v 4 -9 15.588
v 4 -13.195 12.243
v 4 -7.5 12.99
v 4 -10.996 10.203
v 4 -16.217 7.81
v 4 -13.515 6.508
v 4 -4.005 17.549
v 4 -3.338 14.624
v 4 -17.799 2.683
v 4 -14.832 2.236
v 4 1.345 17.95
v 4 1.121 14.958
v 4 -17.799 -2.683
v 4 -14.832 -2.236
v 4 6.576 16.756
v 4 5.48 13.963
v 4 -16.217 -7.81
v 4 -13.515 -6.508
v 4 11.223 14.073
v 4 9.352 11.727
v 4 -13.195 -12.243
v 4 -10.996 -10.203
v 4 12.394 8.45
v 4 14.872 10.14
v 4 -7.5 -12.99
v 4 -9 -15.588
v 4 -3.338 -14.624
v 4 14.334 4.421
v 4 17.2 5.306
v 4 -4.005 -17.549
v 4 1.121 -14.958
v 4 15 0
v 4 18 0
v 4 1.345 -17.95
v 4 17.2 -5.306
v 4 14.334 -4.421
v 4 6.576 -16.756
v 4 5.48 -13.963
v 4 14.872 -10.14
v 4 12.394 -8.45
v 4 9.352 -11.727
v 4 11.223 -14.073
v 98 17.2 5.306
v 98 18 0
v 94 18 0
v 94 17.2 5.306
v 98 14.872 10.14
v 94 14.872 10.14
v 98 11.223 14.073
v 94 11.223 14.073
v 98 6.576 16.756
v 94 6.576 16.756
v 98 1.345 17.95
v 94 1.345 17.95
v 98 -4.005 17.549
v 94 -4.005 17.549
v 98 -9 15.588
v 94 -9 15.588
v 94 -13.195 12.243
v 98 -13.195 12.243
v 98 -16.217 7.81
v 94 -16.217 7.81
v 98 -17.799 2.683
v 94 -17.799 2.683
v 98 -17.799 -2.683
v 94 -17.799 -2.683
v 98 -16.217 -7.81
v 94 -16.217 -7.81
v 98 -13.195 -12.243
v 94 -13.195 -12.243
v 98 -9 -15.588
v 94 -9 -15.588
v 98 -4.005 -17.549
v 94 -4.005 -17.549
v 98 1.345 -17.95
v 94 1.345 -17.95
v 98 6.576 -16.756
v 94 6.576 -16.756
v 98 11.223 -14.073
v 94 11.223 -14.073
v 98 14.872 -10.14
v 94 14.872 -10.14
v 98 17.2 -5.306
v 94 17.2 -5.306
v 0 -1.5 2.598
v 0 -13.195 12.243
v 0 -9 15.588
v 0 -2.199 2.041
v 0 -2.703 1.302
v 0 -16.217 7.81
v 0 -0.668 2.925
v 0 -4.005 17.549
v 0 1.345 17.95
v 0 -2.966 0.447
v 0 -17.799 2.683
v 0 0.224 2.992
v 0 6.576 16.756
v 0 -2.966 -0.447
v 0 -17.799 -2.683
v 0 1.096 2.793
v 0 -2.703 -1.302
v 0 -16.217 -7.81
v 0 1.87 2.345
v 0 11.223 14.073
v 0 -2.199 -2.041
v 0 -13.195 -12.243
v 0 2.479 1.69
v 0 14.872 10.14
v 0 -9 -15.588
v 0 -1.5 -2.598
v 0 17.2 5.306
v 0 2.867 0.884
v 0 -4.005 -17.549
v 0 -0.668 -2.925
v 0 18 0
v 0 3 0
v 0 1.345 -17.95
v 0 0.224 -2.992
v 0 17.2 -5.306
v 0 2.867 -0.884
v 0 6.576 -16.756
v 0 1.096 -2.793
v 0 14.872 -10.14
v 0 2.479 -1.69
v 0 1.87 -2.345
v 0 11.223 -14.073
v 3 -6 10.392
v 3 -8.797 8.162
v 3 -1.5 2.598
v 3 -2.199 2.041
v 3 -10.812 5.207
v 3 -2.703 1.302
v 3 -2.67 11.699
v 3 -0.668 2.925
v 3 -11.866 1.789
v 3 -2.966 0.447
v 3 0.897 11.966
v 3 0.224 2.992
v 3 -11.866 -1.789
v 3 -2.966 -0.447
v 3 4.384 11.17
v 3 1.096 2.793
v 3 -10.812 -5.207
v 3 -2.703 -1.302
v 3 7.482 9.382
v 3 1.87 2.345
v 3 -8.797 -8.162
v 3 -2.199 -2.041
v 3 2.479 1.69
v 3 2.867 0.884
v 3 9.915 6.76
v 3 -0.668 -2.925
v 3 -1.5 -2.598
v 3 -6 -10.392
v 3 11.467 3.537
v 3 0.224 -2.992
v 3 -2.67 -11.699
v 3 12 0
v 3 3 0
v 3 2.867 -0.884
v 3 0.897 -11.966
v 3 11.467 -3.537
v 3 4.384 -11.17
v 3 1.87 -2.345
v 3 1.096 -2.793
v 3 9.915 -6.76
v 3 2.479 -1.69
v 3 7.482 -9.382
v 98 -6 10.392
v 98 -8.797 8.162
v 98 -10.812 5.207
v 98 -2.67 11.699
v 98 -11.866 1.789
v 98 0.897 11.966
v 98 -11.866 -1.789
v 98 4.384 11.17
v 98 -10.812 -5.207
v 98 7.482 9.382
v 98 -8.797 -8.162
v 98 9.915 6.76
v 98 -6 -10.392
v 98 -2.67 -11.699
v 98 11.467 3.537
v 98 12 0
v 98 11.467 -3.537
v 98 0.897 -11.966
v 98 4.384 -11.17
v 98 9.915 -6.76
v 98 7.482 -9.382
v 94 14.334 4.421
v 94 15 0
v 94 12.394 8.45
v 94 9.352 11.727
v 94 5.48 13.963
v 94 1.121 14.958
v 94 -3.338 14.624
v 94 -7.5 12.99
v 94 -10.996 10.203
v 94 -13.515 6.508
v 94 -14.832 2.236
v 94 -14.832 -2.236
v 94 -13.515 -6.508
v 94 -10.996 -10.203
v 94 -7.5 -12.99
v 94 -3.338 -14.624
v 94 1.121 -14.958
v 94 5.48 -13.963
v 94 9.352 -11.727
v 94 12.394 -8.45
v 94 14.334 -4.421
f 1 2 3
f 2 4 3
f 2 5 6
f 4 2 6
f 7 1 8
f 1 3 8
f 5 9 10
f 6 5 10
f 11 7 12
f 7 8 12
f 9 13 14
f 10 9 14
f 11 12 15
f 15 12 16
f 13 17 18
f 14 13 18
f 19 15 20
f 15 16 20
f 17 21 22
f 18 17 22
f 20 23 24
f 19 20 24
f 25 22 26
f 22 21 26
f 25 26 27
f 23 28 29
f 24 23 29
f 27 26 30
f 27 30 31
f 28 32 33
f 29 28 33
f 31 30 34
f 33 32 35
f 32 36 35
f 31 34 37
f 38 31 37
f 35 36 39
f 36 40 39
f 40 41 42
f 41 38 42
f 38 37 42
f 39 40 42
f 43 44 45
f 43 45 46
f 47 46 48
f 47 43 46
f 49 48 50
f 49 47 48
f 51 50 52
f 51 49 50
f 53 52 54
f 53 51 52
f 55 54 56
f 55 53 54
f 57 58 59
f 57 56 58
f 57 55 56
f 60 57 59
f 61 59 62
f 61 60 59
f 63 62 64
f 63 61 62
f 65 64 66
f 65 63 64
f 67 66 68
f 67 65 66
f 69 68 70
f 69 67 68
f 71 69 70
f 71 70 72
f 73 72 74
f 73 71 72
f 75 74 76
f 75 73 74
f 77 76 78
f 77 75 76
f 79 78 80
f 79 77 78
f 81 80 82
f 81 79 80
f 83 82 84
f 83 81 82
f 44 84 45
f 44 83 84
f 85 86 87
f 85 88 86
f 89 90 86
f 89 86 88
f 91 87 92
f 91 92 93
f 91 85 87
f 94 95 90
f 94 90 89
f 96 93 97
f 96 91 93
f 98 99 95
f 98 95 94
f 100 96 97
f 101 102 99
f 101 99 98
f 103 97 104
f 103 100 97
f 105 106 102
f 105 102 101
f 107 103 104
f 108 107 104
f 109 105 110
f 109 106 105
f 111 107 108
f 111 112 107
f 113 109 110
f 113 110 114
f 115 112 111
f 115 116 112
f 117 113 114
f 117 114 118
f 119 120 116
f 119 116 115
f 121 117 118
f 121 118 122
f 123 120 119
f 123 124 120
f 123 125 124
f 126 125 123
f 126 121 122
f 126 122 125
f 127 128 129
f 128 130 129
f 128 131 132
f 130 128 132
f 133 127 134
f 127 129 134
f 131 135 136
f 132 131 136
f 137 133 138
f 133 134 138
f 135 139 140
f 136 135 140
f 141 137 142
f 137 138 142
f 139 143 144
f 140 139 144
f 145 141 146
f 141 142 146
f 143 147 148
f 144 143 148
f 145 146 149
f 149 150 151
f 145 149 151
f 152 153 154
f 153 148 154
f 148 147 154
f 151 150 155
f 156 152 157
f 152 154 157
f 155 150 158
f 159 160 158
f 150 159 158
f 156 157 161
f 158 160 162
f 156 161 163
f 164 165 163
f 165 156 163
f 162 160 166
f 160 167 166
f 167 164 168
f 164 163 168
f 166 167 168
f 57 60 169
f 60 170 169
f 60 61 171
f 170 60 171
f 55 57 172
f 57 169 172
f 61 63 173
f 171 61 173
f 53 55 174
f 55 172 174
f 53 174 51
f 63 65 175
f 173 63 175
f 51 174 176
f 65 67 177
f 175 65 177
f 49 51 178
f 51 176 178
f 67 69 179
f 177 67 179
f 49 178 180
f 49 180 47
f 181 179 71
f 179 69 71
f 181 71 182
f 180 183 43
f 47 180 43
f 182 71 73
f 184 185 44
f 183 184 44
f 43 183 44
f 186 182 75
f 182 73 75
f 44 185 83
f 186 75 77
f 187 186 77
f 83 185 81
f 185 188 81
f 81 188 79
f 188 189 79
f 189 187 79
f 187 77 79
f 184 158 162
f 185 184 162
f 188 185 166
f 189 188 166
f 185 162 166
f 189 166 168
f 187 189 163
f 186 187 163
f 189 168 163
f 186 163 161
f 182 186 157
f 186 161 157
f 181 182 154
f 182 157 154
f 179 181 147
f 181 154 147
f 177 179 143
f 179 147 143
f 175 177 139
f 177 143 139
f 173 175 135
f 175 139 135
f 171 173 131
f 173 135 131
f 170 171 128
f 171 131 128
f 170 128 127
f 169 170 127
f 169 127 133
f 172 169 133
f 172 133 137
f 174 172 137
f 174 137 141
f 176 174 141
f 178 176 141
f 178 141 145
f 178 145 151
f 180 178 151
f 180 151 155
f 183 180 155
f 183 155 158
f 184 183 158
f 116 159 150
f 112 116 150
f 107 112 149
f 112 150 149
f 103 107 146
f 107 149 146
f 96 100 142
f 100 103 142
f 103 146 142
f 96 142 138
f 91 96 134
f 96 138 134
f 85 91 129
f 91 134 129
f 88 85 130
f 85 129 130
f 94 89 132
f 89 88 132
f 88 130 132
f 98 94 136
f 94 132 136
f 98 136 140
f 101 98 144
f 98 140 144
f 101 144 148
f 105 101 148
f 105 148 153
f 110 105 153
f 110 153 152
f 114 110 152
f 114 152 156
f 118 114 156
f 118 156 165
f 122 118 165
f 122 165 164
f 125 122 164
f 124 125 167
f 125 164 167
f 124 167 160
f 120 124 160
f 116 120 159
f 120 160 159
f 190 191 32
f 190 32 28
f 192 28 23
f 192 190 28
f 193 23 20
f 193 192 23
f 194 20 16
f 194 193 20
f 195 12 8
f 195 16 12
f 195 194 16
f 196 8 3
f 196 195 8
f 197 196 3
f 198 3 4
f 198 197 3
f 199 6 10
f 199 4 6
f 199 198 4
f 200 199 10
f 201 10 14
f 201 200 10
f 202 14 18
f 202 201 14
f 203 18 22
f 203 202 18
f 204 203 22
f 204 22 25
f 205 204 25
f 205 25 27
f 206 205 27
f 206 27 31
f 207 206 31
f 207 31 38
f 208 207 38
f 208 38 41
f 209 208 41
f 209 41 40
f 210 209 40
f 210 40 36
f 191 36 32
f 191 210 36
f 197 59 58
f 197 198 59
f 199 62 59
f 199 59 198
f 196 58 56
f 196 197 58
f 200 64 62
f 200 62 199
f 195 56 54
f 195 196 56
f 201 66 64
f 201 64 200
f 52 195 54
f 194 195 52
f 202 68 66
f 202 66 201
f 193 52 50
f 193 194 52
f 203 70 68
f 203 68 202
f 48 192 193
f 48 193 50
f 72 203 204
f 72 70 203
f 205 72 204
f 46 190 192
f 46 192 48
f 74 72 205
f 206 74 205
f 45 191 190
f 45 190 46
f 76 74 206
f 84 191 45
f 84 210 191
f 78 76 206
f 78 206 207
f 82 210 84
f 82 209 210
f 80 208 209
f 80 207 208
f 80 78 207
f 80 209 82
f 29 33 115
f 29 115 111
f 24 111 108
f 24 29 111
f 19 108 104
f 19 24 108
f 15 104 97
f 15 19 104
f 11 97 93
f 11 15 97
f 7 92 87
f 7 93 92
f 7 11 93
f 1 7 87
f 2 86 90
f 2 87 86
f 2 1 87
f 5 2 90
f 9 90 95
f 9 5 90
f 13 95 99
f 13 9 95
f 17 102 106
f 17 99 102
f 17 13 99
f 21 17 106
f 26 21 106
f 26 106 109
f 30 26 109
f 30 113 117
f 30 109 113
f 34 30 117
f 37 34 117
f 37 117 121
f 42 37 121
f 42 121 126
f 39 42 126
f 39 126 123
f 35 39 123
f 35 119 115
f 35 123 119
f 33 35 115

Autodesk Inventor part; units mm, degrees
ref_plane "YZ Plane" through (0, 0, 0) normal (1, 0, 0) x (0, 1, 0)
ref_plane "XZ Plane" through (0, 0, 0) normal (0, 1, 0) x (-1, 0, 0)
ref_plane "XY Plane" through (0, 0, 0) normal (0, 0, 1) x (1, 0, 0)
sketch "Sketch1" plane through (0, 0, 0) normal (0, 0, 1) x (1, 0, 0)
  line L0 (0, 3) -> (0, 18)
  line L1 (0, 18) -> (4, 18)
  line L2 (4, 18) -> (4, 15)
  line L3 (4, 15) -> (94, 15)
  line L4 (94, 15) -> (94, 18)
  line L5 (94, 18) -> (98, 18)
  line L6 (98, 18) -> (98, 12)
  line L7 (98, 12) -> (3, 12)
  line L8 (3, 12) -> (3, 3)
  line L9 (3, 0) -> (0, 0) construction
  line L10 (0, 3) -> (3, 3)
  dimension "d0" = 18
  dimension "d1" = 4
  dimension "d2" = 3
  dimension "d3" = 90
  dimension "d4" = 4
  dimension "d5" = 6
  dimension "d6" = 95
  dimension "d7" = 3
revolve "Revolution1" add sketch "Sketch1" angle 360 about axis through (3, 0, 0) along (-1, 0, 0)
properties part number "Filament Spool Holder"
